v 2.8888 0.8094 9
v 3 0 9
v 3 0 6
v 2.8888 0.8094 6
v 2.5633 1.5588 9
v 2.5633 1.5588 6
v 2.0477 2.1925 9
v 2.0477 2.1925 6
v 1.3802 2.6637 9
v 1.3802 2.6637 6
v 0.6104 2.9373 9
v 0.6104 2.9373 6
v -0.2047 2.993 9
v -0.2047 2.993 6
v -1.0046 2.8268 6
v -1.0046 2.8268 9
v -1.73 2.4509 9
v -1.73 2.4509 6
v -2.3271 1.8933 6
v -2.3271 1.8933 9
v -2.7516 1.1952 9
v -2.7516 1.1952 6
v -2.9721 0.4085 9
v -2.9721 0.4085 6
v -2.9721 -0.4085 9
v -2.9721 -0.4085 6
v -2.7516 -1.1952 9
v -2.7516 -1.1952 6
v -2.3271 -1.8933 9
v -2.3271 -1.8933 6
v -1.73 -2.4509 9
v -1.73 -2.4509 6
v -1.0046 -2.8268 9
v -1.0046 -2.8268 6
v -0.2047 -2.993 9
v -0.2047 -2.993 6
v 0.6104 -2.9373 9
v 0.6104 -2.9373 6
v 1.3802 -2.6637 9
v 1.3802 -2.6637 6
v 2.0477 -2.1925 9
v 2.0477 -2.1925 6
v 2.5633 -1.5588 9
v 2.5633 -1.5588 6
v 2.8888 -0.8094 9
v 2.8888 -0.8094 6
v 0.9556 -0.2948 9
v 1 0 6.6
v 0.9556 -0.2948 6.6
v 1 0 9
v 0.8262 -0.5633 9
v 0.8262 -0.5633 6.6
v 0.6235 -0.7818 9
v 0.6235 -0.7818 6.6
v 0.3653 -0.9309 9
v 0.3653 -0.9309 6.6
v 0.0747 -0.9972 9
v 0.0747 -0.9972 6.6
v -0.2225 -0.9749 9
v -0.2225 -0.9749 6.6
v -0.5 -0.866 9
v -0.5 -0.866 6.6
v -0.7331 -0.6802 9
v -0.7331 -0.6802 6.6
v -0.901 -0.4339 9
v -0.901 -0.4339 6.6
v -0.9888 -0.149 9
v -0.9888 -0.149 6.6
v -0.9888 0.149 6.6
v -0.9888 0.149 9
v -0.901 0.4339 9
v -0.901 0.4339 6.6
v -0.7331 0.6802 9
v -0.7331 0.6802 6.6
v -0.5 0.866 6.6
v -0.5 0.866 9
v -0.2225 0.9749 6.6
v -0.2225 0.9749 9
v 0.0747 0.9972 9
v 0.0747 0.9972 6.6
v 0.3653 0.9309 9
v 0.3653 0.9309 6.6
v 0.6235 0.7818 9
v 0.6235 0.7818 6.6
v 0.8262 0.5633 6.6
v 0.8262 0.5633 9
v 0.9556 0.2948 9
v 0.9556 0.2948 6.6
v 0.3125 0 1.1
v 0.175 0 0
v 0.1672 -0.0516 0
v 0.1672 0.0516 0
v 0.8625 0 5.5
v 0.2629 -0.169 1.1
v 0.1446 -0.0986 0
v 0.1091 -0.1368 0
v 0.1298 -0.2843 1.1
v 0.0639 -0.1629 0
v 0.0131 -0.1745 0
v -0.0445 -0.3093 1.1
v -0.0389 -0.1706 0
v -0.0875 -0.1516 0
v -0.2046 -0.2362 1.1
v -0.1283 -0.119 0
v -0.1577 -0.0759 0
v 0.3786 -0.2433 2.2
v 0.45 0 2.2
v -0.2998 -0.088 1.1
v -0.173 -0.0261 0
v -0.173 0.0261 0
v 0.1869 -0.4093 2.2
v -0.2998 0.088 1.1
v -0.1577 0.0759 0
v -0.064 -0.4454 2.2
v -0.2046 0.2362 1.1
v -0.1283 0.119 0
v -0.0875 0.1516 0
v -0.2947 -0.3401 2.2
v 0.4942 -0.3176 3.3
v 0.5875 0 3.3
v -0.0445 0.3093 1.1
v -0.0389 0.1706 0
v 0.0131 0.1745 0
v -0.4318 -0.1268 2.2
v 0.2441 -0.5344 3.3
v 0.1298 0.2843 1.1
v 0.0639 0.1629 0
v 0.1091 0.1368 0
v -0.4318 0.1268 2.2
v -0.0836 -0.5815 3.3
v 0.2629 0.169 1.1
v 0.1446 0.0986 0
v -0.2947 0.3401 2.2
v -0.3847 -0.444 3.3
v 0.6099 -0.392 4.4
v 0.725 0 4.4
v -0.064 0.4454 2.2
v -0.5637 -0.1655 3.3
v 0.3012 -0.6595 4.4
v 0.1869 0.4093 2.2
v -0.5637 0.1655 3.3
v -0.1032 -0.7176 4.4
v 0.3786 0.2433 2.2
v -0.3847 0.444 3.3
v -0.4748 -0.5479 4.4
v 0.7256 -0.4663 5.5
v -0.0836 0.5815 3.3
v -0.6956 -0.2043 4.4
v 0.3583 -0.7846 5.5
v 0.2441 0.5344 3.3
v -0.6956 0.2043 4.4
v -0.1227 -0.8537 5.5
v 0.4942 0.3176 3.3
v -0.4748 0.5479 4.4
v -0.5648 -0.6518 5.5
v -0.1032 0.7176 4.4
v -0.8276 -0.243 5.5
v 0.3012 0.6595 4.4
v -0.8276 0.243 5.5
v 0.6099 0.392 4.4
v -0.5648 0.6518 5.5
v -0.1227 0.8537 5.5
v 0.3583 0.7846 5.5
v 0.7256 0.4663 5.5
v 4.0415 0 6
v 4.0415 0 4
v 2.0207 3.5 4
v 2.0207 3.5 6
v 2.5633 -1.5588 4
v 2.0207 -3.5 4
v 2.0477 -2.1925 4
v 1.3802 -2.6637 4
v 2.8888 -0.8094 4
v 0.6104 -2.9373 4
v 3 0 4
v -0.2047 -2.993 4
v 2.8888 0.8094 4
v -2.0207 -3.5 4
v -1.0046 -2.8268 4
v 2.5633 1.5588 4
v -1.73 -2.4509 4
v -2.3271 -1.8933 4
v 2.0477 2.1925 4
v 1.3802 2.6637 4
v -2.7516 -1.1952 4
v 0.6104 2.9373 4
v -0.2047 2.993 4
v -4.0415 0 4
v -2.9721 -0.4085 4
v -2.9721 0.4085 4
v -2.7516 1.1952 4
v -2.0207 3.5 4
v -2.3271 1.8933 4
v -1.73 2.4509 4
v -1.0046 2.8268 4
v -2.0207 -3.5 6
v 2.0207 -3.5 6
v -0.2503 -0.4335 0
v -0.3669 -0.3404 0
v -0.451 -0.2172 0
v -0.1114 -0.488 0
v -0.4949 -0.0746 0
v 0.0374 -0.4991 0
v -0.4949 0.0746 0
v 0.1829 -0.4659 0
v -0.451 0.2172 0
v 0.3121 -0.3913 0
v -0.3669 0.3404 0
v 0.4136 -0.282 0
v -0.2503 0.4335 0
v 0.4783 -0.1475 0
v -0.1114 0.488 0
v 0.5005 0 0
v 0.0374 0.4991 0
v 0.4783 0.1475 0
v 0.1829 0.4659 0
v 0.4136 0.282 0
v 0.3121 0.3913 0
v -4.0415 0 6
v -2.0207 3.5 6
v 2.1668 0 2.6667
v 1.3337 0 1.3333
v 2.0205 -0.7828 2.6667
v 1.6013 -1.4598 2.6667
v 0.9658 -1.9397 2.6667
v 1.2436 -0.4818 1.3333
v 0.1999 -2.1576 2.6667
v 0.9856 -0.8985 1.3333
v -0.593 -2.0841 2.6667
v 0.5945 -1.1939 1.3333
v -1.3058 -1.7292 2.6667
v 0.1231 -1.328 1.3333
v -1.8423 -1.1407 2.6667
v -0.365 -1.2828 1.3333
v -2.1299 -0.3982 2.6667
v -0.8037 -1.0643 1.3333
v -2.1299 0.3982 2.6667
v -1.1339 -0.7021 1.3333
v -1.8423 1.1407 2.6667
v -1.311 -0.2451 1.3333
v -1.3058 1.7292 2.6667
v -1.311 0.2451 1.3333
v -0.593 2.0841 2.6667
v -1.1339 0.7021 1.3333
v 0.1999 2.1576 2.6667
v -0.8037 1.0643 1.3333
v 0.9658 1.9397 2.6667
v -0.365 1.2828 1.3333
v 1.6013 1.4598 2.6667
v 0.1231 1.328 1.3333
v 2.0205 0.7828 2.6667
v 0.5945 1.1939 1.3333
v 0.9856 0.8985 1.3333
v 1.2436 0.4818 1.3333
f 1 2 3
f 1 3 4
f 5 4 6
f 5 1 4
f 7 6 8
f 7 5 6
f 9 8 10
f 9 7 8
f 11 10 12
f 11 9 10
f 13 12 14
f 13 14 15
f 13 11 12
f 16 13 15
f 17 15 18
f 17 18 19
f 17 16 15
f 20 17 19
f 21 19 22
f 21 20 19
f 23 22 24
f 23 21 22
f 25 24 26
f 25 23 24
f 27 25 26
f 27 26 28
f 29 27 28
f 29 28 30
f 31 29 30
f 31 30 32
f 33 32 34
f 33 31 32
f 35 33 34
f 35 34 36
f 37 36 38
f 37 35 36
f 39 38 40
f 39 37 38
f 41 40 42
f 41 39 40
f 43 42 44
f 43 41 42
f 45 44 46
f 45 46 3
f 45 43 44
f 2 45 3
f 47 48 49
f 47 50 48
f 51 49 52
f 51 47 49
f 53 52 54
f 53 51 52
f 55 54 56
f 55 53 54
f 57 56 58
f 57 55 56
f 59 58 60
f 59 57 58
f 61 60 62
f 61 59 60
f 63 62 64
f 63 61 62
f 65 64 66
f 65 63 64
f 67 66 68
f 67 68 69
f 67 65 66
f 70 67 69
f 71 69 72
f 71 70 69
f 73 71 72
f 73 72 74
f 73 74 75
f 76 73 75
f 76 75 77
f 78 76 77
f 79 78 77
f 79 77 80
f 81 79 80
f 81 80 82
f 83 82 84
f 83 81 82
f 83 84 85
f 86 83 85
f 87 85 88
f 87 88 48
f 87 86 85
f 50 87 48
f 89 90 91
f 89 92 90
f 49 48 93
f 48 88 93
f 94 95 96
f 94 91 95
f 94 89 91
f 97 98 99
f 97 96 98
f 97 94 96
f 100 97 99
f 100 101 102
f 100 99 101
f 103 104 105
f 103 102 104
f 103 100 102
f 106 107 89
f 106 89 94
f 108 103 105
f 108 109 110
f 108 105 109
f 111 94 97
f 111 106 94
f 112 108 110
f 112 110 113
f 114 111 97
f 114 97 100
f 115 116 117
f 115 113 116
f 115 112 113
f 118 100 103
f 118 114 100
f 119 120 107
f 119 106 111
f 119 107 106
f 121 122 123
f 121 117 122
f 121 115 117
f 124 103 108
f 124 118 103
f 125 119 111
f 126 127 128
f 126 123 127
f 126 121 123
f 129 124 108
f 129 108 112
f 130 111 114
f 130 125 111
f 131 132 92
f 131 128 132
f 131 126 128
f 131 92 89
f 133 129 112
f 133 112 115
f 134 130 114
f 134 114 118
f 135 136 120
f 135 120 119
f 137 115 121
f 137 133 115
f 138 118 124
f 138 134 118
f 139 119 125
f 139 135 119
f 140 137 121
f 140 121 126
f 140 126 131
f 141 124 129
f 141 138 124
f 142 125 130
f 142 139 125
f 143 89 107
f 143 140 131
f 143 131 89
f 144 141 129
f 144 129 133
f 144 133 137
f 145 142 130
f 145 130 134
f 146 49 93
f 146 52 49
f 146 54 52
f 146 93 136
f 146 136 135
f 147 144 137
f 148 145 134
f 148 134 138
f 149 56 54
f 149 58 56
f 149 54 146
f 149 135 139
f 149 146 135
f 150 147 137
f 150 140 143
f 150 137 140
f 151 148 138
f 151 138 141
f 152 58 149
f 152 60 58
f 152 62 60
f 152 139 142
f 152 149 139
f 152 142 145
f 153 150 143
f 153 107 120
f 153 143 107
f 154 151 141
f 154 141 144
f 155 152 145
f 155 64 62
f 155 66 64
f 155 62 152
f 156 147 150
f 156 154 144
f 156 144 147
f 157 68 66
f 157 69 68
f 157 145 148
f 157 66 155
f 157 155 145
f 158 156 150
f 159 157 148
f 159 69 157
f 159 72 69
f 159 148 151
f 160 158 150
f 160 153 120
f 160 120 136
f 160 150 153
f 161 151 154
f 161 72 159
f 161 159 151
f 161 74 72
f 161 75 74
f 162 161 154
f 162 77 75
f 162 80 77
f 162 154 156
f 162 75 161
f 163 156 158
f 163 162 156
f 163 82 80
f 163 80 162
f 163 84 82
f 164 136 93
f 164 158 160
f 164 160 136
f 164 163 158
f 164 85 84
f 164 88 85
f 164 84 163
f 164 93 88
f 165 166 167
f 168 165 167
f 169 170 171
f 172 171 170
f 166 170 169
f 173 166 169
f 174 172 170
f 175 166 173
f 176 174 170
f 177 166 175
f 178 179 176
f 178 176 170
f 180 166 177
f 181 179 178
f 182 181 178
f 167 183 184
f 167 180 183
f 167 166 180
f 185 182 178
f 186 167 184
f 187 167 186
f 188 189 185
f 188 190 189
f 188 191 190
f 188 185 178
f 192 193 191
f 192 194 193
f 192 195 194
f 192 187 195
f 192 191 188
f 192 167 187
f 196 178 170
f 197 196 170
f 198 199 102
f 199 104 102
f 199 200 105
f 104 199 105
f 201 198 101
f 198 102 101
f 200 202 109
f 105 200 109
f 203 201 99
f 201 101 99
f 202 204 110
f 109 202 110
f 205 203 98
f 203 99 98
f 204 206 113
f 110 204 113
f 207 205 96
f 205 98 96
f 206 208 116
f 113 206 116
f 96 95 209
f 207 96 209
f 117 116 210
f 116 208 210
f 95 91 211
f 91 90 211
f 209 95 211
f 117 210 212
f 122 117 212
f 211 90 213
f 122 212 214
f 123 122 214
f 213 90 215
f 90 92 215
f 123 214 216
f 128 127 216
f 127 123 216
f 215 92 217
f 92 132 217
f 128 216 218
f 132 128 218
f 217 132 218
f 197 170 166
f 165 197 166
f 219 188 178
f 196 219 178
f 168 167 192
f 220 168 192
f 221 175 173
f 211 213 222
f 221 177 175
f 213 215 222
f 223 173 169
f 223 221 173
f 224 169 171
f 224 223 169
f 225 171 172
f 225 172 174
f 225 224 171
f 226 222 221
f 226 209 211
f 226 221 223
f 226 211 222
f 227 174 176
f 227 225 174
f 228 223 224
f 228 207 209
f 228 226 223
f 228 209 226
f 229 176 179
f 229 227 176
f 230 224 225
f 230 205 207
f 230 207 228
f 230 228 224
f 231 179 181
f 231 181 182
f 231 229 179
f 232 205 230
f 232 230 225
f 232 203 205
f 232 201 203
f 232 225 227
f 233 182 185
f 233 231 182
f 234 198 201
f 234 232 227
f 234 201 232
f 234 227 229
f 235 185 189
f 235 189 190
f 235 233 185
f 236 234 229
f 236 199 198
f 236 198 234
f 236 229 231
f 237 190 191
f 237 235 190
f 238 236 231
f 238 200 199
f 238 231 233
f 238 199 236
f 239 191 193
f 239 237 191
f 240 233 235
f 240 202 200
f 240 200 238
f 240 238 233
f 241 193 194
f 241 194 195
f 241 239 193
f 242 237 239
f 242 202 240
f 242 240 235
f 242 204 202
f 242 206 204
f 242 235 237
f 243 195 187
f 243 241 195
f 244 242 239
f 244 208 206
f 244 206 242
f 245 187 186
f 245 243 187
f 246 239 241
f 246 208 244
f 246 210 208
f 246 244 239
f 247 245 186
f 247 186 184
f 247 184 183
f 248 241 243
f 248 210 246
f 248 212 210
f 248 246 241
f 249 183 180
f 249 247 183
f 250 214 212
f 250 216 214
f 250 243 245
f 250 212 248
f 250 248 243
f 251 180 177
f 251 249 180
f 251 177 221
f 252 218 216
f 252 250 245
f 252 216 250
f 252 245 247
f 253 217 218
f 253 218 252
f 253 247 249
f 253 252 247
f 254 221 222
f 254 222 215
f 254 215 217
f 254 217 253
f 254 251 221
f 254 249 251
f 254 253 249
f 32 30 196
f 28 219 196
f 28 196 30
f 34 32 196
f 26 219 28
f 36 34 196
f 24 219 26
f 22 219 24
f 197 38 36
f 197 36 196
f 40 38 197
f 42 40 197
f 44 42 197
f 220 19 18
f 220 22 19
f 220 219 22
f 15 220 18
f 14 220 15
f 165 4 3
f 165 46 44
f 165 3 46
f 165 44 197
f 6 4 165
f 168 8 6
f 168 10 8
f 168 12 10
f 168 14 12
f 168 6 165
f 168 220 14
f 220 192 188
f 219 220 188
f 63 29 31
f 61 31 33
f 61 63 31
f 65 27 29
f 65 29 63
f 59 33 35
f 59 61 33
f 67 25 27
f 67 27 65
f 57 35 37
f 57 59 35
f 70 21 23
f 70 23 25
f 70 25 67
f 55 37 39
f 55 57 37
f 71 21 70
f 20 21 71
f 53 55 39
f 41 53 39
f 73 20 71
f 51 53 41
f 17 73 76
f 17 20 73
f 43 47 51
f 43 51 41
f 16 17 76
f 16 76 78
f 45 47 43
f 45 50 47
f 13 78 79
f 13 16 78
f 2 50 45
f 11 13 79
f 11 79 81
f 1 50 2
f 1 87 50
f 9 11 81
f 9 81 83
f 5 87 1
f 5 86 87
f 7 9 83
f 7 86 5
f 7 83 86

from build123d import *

# Parameters (mm, degrees)
BOSS_EXTRU_1_DEPTH      = 9
ESQUISSE2_W             = 15.557161579
ESQUISSE2_H             = 11.468773674
ESQUISSE2_R             = 3
ENL_V_MAT_EXTRU_1_DEPTH = 3
ENL_V_START             = -4
ESQUISSE3_W             = 15.323034965
ESQUISSE3_H             = 11.861185192
ESQUISSE3_R             = 3
ENL_V_MAT_EXTRU_3_DEPTH = 4
CHANFREIN2_SIZE         = 4
CHANFREIN2_SIZE_2       = 2.499477408


with BuildPart() as part:
    # Esquisse1 → Boss.-Extru.1 (new body)
    with BuildSketch(Plane.XY):
        Polygon((4.041451884, 0), (2.020725942, 3.5), (-2.020725942, 3.5), (-4.041451884, 0), (-2.020725942, -3.5), (2.020725942, -3.5), align=None)
    extrude(amount=BOSS_EXTRU_1_DEPTH)

    # Esquisse2 → Enlèv. mat.-Extru.1 (cut)
    with BuildSketch(Plane.XY.offset(9)):
        with Locations((-0.212602531, -0.232116366)):
            Rectangle(ESQUISSE2_W, ESQUISSE2_H)
        Circle(ESQUISSE2_R, mode=Mode.SUBTRACT)
    extrude(amount=-ENL_V_MAT_EXTRU_1_DEPTH, mode=Mode.SUBTRACT)

    # Esquisse3 → Enlèv. mat.-Extru.3 (cut)
    with BuildSketch(Plane(origin=(0, 0, 0), x_dir=(-1, 0, 0), z_dir=(0, 0, -1)).offset(ENL_V_START)):
        with Locations((0.20407301, -0.146192801)):
            Rectangle(ESQUISSE3_W, ESQUISSE3_H)
        with Locations(Location((0, 0, 0), (0, 0, 180))):
            Circle(ESQUISSE3_R, mode=Mode.SUBTRACT)
    extrude(amount=ENL_V_MAT_EXTRU_3_DEPTH, mode=Mode.SUBTRACT)

    # Chanfrein2
    # the kernel refuses this chamfer: 4, 2.499477408 mm, written as the material it takes off along each edge
    with BuildSketch(Plane(origin=(0, 0, 0), x_dir=(1, 0, 0), z_dir=(0, 1, 0))) as chanfrein2_piece_1_section:
        Polygon((3, -CHANFREIN2_SIZE), (3 - CHANFREIN2_SIZE_2, 0), (3, 0), align=None)
    chanfrein2_piece_1 = revolve(axis=Axis((0, 0, 0), (0, 0, -1)), mode=Mode.PRIVATE)
    chanfrein2_piece_1 = split(chanfrein2_piece_1, bisect_by=Plane(origin=(-1.744026904, 0, 4), z_dir=(0, 0, -1)), keep=Keep.TOP, mode=Mode.PRIVATE)
    add(chanfrein2_piece_1, mode=Mode.SUBTRACT)

    # Esquisse4 → Enlèvement de matière-Révolution1 (revolve, cut)
    with BuildSketch(Plane(origin=(0, 0, 0), x_dir=(1, 0, 0), z_dir=(0, 1, 0))):
        Polygon((0, 1.4), (1, -6.6), (1, -9), (0, -9), align=None)
    revolve(axis=Axis((0, 0, 9), (0, 0, -1)), mode=Mode.SUBTRACT)


solid = part.part
